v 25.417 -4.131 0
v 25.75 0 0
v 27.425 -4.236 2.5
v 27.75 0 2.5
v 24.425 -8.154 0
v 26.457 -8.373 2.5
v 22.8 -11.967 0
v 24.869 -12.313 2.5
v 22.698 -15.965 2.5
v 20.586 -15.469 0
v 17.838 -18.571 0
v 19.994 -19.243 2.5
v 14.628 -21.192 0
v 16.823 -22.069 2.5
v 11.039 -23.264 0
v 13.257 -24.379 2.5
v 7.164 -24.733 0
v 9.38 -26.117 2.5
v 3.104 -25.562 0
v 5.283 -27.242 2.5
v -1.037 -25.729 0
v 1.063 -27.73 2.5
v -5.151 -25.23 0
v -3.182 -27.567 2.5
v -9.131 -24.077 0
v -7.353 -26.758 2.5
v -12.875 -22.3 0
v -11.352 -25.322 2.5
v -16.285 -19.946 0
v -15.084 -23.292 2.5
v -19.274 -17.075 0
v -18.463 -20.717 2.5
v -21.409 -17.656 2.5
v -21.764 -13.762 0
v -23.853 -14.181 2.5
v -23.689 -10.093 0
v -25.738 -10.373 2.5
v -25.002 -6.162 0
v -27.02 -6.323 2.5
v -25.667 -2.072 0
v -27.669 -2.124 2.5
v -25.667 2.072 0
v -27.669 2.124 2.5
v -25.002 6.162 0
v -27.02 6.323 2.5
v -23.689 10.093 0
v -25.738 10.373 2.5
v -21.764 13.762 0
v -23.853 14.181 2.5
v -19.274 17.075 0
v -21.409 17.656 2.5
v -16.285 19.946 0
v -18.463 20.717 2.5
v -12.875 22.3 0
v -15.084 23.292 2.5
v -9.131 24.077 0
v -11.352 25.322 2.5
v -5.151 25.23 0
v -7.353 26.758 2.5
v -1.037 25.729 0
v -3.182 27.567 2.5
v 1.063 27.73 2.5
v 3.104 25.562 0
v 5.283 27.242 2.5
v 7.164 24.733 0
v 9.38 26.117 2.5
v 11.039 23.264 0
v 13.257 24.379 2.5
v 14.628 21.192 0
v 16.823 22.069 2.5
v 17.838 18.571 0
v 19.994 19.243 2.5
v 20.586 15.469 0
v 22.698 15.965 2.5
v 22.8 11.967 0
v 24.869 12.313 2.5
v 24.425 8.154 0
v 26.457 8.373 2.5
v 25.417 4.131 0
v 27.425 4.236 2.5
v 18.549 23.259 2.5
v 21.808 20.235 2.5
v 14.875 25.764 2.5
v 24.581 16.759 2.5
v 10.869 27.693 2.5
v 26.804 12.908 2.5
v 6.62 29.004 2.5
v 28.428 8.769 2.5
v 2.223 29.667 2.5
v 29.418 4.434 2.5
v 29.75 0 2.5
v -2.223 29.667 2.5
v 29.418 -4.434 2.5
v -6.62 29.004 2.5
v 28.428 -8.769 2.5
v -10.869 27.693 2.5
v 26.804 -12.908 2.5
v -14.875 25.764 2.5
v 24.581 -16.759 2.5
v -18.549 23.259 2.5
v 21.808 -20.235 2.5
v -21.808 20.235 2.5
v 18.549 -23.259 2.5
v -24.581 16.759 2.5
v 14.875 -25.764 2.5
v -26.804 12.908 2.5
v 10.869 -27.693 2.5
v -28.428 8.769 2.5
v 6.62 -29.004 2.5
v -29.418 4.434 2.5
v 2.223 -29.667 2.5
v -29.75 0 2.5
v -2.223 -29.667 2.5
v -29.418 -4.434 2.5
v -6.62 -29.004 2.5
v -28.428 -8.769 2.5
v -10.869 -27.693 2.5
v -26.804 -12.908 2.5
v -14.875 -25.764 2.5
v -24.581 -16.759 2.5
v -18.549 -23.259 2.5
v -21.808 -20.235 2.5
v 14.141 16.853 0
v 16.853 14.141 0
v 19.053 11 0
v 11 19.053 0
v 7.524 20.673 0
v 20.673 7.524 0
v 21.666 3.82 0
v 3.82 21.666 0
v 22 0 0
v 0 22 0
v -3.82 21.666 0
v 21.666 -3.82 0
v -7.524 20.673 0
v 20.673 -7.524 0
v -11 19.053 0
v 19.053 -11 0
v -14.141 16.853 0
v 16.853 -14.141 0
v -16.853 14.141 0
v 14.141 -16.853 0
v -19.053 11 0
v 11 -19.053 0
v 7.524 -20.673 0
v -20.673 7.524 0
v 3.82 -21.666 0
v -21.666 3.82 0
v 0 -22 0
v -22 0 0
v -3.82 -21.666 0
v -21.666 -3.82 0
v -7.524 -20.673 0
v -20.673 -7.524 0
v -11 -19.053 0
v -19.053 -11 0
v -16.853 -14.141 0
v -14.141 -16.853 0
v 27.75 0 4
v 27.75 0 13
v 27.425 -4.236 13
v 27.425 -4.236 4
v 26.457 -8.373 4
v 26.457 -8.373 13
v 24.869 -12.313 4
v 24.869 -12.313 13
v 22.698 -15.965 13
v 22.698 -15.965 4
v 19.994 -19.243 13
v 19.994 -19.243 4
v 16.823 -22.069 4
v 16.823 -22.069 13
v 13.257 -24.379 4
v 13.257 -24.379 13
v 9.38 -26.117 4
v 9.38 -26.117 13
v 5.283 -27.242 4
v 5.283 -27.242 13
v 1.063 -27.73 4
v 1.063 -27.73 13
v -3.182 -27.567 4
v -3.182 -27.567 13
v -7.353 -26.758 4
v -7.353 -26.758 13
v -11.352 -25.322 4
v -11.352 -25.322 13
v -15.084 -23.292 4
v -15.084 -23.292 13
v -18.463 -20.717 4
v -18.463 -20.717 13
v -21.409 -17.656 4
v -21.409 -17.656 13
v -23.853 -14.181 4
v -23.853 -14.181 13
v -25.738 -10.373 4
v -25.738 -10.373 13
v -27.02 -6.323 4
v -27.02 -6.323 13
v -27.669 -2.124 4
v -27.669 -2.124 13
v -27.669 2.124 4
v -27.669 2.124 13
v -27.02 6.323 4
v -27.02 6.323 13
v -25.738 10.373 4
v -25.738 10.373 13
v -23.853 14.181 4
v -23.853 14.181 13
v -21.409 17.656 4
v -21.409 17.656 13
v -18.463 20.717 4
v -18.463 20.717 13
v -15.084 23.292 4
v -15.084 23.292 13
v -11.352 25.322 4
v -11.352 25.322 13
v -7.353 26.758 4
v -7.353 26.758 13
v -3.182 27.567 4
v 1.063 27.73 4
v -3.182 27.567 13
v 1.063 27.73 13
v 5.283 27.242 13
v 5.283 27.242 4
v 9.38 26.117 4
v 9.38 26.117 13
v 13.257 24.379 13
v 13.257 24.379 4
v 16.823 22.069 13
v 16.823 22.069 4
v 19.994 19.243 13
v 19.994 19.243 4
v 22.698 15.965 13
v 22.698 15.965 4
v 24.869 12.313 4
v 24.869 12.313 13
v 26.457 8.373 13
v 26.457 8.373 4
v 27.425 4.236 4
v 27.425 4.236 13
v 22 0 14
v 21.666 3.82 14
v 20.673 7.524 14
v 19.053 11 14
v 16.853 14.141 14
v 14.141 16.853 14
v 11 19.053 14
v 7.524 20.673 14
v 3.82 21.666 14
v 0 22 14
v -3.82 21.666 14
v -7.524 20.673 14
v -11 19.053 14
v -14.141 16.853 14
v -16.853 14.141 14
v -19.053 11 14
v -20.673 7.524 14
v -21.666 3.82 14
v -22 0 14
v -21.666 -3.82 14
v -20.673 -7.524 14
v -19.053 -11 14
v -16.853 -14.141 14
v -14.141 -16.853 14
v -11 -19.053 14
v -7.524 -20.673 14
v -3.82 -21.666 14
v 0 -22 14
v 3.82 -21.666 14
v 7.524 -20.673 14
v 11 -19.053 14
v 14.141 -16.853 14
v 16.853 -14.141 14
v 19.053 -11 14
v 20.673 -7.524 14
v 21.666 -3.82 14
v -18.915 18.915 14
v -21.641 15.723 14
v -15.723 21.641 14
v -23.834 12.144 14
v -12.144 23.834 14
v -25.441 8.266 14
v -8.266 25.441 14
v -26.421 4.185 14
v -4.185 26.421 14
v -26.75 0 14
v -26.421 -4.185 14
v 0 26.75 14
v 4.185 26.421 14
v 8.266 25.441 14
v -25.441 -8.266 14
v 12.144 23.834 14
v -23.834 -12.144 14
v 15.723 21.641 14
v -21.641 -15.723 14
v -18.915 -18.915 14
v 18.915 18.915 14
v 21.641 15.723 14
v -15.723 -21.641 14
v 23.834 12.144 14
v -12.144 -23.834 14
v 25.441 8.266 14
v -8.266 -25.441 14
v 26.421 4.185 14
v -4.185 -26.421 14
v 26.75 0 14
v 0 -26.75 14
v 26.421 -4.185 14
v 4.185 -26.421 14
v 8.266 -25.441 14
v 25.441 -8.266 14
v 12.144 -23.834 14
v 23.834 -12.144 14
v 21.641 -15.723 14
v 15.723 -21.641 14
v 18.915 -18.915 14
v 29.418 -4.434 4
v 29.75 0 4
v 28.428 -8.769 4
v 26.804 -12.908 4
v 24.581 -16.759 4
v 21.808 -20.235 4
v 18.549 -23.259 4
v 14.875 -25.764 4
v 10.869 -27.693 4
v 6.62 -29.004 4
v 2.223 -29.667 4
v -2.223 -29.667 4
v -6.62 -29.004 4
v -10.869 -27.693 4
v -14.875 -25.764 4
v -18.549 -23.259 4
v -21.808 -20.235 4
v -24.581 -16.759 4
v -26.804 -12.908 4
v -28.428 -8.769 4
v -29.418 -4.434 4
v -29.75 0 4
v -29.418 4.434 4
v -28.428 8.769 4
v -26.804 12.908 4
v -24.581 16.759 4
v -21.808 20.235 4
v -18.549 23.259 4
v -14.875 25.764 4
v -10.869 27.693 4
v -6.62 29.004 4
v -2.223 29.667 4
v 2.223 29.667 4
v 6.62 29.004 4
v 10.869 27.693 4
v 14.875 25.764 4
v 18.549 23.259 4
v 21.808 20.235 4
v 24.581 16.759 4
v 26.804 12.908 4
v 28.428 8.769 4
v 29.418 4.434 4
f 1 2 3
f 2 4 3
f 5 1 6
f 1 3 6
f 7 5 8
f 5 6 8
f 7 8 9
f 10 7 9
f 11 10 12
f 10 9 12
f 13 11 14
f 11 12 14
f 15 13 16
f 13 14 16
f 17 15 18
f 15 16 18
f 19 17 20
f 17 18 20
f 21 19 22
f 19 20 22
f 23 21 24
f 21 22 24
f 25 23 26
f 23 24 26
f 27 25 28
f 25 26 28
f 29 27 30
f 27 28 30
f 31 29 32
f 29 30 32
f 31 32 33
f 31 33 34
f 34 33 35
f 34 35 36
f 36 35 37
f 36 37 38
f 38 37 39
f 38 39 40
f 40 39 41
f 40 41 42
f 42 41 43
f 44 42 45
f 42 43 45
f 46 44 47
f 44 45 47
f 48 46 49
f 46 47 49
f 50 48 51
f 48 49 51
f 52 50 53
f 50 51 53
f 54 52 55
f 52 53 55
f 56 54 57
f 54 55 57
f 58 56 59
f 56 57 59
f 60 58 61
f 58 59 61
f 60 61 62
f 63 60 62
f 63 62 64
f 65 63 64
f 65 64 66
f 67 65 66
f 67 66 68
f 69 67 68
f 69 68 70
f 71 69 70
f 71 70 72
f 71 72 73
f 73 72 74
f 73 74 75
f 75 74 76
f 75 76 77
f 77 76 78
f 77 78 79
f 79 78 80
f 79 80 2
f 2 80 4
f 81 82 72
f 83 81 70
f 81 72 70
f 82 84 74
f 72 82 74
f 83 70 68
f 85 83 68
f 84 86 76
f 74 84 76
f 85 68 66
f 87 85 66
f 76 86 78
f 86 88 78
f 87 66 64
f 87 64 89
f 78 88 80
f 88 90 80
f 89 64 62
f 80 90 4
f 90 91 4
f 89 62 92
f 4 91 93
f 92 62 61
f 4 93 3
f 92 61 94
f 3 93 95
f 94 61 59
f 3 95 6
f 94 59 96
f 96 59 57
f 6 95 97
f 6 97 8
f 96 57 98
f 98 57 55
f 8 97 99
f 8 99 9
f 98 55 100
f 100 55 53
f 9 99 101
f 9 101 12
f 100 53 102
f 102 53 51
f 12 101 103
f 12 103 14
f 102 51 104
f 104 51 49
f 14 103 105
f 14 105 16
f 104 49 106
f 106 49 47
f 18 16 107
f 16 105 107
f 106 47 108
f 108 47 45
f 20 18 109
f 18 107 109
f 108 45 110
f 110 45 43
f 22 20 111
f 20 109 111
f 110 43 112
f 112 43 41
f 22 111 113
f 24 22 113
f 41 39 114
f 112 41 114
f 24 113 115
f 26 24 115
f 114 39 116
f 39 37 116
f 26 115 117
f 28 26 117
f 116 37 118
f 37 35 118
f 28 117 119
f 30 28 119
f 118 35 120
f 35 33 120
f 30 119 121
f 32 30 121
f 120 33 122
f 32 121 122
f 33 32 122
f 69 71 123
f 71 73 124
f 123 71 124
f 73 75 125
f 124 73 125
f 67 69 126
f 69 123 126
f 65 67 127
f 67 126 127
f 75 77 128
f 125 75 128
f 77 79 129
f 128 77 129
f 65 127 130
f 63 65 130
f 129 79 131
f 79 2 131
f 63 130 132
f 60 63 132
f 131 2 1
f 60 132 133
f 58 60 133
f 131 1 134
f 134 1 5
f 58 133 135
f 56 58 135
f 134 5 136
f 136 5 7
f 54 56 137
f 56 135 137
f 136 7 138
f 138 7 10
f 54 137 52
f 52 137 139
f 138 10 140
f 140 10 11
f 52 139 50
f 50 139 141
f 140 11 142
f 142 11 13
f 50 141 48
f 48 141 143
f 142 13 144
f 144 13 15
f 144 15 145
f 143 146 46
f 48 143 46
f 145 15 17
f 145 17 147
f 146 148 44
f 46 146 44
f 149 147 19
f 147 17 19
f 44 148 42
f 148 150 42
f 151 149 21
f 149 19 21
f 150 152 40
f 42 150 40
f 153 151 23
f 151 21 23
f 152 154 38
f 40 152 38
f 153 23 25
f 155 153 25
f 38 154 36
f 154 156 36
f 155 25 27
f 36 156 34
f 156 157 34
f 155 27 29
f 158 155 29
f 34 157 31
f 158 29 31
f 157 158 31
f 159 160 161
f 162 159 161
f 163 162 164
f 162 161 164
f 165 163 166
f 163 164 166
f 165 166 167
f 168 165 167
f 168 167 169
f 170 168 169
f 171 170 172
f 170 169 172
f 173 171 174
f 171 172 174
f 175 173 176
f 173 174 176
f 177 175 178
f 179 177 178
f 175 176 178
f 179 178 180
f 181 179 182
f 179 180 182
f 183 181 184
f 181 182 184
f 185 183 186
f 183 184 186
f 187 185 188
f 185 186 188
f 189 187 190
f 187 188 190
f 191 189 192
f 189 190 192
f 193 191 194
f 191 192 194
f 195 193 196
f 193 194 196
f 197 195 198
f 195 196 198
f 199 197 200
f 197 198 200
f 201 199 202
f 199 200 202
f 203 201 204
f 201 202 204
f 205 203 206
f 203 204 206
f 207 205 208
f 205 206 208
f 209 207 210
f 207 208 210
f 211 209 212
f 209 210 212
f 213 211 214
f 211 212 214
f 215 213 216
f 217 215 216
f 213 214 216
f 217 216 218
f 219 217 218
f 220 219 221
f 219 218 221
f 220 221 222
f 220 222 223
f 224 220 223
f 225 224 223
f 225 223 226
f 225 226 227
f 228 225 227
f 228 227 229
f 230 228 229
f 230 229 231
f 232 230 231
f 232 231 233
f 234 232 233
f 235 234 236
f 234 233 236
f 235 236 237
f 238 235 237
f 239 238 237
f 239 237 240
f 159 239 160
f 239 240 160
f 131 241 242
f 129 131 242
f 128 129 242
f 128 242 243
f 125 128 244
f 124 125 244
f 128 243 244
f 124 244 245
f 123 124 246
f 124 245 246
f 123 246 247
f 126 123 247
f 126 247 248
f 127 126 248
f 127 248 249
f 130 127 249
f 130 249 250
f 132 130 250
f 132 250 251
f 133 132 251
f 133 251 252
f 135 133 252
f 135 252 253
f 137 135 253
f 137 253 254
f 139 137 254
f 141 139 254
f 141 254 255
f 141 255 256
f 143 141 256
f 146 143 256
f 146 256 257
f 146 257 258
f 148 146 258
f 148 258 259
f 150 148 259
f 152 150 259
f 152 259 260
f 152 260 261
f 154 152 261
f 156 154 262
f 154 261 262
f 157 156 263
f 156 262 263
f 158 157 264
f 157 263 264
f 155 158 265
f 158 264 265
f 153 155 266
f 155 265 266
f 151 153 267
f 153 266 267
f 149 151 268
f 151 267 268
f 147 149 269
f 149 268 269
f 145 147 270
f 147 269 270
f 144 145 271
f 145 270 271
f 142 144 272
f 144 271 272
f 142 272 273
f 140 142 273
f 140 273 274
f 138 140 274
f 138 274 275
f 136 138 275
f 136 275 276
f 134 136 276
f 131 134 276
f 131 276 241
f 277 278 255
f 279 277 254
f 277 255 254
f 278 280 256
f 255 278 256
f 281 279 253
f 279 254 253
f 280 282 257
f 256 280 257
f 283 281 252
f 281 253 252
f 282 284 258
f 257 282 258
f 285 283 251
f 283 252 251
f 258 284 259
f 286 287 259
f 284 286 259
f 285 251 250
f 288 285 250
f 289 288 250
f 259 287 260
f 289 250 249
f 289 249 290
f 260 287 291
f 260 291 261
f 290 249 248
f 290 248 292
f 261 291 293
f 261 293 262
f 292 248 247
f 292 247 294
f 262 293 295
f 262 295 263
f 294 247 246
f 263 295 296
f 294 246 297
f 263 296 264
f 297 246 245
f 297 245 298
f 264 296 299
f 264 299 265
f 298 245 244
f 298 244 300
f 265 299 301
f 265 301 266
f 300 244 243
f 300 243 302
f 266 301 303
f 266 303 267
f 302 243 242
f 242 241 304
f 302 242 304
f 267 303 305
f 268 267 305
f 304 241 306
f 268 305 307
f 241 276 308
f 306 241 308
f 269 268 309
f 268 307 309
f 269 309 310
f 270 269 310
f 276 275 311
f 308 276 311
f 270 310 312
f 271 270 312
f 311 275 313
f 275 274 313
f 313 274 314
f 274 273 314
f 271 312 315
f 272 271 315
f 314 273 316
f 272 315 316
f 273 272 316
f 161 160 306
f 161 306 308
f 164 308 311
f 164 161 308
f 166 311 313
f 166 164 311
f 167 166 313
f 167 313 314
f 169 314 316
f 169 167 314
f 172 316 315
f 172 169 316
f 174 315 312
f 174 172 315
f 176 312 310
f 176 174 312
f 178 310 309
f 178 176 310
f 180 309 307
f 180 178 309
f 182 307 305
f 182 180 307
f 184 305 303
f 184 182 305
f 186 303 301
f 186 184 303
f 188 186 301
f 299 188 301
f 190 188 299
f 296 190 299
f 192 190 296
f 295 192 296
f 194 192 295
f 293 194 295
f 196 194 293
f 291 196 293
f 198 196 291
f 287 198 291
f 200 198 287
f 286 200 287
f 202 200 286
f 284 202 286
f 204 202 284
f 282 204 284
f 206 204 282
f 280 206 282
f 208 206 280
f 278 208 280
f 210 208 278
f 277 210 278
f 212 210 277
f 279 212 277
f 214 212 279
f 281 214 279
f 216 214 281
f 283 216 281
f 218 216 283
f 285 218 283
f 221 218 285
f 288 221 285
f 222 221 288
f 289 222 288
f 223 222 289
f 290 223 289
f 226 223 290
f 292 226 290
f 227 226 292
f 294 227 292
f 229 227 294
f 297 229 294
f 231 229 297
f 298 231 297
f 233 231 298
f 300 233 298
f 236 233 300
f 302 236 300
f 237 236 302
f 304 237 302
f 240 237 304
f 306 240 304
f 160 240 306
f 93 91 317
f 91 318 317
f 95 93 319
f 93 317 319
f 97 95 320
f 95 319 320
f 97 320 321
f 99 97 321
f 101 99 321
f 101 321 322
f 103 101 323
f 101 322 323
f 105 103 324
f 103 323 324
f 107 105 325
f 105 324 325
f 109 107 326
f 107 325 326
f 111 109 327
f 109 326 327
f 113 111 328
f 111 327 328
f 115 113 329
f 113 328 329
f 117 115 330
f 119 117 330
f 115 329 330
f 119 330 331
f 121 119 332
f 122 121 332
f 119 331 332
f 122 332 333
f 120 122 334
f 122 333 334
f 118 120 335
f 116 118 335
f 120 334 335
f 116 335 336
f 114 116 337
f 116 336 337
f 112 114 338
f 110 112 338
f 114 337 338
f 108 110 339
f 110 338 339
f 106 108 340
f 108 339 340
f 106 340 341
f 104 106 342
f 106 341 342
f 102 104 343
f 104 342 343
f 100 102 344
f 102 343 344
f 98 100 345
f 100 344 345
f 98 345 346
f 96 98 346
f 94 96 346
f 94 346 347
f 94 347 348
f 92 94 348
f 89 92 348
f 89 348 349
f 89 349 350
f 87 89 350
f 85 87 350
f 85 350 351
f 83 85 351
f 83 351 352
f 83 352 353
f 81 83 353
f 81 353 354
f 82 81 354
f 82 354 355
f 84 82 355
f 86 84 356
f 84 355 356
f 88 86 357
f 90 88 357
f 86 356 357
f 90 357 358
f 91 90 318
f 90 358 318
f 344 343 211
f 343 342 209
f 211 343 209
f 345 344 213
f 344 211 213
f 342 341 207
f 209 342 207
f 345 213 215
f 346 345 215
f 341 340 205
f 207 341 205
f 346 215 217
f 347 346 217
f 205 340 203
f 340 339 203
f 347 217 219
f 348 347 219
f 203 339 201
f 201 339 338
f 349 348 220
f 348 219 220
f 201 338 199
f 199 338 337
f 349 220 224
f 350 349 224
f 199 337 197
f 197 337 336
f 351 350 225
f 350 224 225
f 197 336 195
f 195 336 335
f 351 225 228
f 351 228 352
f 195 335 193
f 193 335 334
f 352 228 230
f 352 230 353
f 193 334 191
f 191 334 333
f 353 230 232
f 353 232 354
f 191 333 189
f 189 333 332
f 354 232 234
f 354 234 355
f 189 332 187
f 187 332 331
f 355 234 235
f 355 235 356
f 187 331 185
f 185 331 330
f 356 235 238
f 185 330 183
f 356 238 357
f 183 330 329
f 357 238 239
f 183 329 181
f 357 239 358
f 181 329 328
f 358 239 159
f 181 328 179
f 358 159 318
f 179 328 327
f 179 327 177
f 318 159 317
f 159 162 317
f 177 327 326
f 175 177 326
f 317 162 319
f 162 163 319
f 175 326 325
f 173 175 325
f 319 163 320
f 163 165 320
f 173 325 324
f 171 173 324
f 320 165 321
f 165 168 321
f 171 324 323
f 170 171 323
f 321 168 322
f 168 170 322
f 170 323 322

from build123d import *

# Parameters (mm, degrees)
F2_R     = 22
F3_DEPTH = 25
F4_SIZE  = 1


with BuildPart() as f1:
    # F0 (on Front) → F1 (revolve)
    with BuildSketch(Plane.XZ):
        Polygon((0, 14), (0, 0), (25.75, 0), (27.75, 2.5), (29.75, 2.5), (29.75, 4), (27.75, 4), (27.75, 14), align=None)
    revolve(axis=Axis((0, 0, 7), (0, 0, -1)))

    # F2 (on face) → F3 (cut)
    with BuildSketch(Plane.XY.offset(14)):
        Circle(F2_R)
    extrude(amount=-F3_DEPTH, mode=Mode.SUBTRACT)

    # F4
    f4_edges = [f1.edges().sort_by_distance(p)[0] for p in [
        (-27.75, 0, 14),
    ]]
    chamfer(f4_edges, length=F4_SIZE)


solid = f1.part
